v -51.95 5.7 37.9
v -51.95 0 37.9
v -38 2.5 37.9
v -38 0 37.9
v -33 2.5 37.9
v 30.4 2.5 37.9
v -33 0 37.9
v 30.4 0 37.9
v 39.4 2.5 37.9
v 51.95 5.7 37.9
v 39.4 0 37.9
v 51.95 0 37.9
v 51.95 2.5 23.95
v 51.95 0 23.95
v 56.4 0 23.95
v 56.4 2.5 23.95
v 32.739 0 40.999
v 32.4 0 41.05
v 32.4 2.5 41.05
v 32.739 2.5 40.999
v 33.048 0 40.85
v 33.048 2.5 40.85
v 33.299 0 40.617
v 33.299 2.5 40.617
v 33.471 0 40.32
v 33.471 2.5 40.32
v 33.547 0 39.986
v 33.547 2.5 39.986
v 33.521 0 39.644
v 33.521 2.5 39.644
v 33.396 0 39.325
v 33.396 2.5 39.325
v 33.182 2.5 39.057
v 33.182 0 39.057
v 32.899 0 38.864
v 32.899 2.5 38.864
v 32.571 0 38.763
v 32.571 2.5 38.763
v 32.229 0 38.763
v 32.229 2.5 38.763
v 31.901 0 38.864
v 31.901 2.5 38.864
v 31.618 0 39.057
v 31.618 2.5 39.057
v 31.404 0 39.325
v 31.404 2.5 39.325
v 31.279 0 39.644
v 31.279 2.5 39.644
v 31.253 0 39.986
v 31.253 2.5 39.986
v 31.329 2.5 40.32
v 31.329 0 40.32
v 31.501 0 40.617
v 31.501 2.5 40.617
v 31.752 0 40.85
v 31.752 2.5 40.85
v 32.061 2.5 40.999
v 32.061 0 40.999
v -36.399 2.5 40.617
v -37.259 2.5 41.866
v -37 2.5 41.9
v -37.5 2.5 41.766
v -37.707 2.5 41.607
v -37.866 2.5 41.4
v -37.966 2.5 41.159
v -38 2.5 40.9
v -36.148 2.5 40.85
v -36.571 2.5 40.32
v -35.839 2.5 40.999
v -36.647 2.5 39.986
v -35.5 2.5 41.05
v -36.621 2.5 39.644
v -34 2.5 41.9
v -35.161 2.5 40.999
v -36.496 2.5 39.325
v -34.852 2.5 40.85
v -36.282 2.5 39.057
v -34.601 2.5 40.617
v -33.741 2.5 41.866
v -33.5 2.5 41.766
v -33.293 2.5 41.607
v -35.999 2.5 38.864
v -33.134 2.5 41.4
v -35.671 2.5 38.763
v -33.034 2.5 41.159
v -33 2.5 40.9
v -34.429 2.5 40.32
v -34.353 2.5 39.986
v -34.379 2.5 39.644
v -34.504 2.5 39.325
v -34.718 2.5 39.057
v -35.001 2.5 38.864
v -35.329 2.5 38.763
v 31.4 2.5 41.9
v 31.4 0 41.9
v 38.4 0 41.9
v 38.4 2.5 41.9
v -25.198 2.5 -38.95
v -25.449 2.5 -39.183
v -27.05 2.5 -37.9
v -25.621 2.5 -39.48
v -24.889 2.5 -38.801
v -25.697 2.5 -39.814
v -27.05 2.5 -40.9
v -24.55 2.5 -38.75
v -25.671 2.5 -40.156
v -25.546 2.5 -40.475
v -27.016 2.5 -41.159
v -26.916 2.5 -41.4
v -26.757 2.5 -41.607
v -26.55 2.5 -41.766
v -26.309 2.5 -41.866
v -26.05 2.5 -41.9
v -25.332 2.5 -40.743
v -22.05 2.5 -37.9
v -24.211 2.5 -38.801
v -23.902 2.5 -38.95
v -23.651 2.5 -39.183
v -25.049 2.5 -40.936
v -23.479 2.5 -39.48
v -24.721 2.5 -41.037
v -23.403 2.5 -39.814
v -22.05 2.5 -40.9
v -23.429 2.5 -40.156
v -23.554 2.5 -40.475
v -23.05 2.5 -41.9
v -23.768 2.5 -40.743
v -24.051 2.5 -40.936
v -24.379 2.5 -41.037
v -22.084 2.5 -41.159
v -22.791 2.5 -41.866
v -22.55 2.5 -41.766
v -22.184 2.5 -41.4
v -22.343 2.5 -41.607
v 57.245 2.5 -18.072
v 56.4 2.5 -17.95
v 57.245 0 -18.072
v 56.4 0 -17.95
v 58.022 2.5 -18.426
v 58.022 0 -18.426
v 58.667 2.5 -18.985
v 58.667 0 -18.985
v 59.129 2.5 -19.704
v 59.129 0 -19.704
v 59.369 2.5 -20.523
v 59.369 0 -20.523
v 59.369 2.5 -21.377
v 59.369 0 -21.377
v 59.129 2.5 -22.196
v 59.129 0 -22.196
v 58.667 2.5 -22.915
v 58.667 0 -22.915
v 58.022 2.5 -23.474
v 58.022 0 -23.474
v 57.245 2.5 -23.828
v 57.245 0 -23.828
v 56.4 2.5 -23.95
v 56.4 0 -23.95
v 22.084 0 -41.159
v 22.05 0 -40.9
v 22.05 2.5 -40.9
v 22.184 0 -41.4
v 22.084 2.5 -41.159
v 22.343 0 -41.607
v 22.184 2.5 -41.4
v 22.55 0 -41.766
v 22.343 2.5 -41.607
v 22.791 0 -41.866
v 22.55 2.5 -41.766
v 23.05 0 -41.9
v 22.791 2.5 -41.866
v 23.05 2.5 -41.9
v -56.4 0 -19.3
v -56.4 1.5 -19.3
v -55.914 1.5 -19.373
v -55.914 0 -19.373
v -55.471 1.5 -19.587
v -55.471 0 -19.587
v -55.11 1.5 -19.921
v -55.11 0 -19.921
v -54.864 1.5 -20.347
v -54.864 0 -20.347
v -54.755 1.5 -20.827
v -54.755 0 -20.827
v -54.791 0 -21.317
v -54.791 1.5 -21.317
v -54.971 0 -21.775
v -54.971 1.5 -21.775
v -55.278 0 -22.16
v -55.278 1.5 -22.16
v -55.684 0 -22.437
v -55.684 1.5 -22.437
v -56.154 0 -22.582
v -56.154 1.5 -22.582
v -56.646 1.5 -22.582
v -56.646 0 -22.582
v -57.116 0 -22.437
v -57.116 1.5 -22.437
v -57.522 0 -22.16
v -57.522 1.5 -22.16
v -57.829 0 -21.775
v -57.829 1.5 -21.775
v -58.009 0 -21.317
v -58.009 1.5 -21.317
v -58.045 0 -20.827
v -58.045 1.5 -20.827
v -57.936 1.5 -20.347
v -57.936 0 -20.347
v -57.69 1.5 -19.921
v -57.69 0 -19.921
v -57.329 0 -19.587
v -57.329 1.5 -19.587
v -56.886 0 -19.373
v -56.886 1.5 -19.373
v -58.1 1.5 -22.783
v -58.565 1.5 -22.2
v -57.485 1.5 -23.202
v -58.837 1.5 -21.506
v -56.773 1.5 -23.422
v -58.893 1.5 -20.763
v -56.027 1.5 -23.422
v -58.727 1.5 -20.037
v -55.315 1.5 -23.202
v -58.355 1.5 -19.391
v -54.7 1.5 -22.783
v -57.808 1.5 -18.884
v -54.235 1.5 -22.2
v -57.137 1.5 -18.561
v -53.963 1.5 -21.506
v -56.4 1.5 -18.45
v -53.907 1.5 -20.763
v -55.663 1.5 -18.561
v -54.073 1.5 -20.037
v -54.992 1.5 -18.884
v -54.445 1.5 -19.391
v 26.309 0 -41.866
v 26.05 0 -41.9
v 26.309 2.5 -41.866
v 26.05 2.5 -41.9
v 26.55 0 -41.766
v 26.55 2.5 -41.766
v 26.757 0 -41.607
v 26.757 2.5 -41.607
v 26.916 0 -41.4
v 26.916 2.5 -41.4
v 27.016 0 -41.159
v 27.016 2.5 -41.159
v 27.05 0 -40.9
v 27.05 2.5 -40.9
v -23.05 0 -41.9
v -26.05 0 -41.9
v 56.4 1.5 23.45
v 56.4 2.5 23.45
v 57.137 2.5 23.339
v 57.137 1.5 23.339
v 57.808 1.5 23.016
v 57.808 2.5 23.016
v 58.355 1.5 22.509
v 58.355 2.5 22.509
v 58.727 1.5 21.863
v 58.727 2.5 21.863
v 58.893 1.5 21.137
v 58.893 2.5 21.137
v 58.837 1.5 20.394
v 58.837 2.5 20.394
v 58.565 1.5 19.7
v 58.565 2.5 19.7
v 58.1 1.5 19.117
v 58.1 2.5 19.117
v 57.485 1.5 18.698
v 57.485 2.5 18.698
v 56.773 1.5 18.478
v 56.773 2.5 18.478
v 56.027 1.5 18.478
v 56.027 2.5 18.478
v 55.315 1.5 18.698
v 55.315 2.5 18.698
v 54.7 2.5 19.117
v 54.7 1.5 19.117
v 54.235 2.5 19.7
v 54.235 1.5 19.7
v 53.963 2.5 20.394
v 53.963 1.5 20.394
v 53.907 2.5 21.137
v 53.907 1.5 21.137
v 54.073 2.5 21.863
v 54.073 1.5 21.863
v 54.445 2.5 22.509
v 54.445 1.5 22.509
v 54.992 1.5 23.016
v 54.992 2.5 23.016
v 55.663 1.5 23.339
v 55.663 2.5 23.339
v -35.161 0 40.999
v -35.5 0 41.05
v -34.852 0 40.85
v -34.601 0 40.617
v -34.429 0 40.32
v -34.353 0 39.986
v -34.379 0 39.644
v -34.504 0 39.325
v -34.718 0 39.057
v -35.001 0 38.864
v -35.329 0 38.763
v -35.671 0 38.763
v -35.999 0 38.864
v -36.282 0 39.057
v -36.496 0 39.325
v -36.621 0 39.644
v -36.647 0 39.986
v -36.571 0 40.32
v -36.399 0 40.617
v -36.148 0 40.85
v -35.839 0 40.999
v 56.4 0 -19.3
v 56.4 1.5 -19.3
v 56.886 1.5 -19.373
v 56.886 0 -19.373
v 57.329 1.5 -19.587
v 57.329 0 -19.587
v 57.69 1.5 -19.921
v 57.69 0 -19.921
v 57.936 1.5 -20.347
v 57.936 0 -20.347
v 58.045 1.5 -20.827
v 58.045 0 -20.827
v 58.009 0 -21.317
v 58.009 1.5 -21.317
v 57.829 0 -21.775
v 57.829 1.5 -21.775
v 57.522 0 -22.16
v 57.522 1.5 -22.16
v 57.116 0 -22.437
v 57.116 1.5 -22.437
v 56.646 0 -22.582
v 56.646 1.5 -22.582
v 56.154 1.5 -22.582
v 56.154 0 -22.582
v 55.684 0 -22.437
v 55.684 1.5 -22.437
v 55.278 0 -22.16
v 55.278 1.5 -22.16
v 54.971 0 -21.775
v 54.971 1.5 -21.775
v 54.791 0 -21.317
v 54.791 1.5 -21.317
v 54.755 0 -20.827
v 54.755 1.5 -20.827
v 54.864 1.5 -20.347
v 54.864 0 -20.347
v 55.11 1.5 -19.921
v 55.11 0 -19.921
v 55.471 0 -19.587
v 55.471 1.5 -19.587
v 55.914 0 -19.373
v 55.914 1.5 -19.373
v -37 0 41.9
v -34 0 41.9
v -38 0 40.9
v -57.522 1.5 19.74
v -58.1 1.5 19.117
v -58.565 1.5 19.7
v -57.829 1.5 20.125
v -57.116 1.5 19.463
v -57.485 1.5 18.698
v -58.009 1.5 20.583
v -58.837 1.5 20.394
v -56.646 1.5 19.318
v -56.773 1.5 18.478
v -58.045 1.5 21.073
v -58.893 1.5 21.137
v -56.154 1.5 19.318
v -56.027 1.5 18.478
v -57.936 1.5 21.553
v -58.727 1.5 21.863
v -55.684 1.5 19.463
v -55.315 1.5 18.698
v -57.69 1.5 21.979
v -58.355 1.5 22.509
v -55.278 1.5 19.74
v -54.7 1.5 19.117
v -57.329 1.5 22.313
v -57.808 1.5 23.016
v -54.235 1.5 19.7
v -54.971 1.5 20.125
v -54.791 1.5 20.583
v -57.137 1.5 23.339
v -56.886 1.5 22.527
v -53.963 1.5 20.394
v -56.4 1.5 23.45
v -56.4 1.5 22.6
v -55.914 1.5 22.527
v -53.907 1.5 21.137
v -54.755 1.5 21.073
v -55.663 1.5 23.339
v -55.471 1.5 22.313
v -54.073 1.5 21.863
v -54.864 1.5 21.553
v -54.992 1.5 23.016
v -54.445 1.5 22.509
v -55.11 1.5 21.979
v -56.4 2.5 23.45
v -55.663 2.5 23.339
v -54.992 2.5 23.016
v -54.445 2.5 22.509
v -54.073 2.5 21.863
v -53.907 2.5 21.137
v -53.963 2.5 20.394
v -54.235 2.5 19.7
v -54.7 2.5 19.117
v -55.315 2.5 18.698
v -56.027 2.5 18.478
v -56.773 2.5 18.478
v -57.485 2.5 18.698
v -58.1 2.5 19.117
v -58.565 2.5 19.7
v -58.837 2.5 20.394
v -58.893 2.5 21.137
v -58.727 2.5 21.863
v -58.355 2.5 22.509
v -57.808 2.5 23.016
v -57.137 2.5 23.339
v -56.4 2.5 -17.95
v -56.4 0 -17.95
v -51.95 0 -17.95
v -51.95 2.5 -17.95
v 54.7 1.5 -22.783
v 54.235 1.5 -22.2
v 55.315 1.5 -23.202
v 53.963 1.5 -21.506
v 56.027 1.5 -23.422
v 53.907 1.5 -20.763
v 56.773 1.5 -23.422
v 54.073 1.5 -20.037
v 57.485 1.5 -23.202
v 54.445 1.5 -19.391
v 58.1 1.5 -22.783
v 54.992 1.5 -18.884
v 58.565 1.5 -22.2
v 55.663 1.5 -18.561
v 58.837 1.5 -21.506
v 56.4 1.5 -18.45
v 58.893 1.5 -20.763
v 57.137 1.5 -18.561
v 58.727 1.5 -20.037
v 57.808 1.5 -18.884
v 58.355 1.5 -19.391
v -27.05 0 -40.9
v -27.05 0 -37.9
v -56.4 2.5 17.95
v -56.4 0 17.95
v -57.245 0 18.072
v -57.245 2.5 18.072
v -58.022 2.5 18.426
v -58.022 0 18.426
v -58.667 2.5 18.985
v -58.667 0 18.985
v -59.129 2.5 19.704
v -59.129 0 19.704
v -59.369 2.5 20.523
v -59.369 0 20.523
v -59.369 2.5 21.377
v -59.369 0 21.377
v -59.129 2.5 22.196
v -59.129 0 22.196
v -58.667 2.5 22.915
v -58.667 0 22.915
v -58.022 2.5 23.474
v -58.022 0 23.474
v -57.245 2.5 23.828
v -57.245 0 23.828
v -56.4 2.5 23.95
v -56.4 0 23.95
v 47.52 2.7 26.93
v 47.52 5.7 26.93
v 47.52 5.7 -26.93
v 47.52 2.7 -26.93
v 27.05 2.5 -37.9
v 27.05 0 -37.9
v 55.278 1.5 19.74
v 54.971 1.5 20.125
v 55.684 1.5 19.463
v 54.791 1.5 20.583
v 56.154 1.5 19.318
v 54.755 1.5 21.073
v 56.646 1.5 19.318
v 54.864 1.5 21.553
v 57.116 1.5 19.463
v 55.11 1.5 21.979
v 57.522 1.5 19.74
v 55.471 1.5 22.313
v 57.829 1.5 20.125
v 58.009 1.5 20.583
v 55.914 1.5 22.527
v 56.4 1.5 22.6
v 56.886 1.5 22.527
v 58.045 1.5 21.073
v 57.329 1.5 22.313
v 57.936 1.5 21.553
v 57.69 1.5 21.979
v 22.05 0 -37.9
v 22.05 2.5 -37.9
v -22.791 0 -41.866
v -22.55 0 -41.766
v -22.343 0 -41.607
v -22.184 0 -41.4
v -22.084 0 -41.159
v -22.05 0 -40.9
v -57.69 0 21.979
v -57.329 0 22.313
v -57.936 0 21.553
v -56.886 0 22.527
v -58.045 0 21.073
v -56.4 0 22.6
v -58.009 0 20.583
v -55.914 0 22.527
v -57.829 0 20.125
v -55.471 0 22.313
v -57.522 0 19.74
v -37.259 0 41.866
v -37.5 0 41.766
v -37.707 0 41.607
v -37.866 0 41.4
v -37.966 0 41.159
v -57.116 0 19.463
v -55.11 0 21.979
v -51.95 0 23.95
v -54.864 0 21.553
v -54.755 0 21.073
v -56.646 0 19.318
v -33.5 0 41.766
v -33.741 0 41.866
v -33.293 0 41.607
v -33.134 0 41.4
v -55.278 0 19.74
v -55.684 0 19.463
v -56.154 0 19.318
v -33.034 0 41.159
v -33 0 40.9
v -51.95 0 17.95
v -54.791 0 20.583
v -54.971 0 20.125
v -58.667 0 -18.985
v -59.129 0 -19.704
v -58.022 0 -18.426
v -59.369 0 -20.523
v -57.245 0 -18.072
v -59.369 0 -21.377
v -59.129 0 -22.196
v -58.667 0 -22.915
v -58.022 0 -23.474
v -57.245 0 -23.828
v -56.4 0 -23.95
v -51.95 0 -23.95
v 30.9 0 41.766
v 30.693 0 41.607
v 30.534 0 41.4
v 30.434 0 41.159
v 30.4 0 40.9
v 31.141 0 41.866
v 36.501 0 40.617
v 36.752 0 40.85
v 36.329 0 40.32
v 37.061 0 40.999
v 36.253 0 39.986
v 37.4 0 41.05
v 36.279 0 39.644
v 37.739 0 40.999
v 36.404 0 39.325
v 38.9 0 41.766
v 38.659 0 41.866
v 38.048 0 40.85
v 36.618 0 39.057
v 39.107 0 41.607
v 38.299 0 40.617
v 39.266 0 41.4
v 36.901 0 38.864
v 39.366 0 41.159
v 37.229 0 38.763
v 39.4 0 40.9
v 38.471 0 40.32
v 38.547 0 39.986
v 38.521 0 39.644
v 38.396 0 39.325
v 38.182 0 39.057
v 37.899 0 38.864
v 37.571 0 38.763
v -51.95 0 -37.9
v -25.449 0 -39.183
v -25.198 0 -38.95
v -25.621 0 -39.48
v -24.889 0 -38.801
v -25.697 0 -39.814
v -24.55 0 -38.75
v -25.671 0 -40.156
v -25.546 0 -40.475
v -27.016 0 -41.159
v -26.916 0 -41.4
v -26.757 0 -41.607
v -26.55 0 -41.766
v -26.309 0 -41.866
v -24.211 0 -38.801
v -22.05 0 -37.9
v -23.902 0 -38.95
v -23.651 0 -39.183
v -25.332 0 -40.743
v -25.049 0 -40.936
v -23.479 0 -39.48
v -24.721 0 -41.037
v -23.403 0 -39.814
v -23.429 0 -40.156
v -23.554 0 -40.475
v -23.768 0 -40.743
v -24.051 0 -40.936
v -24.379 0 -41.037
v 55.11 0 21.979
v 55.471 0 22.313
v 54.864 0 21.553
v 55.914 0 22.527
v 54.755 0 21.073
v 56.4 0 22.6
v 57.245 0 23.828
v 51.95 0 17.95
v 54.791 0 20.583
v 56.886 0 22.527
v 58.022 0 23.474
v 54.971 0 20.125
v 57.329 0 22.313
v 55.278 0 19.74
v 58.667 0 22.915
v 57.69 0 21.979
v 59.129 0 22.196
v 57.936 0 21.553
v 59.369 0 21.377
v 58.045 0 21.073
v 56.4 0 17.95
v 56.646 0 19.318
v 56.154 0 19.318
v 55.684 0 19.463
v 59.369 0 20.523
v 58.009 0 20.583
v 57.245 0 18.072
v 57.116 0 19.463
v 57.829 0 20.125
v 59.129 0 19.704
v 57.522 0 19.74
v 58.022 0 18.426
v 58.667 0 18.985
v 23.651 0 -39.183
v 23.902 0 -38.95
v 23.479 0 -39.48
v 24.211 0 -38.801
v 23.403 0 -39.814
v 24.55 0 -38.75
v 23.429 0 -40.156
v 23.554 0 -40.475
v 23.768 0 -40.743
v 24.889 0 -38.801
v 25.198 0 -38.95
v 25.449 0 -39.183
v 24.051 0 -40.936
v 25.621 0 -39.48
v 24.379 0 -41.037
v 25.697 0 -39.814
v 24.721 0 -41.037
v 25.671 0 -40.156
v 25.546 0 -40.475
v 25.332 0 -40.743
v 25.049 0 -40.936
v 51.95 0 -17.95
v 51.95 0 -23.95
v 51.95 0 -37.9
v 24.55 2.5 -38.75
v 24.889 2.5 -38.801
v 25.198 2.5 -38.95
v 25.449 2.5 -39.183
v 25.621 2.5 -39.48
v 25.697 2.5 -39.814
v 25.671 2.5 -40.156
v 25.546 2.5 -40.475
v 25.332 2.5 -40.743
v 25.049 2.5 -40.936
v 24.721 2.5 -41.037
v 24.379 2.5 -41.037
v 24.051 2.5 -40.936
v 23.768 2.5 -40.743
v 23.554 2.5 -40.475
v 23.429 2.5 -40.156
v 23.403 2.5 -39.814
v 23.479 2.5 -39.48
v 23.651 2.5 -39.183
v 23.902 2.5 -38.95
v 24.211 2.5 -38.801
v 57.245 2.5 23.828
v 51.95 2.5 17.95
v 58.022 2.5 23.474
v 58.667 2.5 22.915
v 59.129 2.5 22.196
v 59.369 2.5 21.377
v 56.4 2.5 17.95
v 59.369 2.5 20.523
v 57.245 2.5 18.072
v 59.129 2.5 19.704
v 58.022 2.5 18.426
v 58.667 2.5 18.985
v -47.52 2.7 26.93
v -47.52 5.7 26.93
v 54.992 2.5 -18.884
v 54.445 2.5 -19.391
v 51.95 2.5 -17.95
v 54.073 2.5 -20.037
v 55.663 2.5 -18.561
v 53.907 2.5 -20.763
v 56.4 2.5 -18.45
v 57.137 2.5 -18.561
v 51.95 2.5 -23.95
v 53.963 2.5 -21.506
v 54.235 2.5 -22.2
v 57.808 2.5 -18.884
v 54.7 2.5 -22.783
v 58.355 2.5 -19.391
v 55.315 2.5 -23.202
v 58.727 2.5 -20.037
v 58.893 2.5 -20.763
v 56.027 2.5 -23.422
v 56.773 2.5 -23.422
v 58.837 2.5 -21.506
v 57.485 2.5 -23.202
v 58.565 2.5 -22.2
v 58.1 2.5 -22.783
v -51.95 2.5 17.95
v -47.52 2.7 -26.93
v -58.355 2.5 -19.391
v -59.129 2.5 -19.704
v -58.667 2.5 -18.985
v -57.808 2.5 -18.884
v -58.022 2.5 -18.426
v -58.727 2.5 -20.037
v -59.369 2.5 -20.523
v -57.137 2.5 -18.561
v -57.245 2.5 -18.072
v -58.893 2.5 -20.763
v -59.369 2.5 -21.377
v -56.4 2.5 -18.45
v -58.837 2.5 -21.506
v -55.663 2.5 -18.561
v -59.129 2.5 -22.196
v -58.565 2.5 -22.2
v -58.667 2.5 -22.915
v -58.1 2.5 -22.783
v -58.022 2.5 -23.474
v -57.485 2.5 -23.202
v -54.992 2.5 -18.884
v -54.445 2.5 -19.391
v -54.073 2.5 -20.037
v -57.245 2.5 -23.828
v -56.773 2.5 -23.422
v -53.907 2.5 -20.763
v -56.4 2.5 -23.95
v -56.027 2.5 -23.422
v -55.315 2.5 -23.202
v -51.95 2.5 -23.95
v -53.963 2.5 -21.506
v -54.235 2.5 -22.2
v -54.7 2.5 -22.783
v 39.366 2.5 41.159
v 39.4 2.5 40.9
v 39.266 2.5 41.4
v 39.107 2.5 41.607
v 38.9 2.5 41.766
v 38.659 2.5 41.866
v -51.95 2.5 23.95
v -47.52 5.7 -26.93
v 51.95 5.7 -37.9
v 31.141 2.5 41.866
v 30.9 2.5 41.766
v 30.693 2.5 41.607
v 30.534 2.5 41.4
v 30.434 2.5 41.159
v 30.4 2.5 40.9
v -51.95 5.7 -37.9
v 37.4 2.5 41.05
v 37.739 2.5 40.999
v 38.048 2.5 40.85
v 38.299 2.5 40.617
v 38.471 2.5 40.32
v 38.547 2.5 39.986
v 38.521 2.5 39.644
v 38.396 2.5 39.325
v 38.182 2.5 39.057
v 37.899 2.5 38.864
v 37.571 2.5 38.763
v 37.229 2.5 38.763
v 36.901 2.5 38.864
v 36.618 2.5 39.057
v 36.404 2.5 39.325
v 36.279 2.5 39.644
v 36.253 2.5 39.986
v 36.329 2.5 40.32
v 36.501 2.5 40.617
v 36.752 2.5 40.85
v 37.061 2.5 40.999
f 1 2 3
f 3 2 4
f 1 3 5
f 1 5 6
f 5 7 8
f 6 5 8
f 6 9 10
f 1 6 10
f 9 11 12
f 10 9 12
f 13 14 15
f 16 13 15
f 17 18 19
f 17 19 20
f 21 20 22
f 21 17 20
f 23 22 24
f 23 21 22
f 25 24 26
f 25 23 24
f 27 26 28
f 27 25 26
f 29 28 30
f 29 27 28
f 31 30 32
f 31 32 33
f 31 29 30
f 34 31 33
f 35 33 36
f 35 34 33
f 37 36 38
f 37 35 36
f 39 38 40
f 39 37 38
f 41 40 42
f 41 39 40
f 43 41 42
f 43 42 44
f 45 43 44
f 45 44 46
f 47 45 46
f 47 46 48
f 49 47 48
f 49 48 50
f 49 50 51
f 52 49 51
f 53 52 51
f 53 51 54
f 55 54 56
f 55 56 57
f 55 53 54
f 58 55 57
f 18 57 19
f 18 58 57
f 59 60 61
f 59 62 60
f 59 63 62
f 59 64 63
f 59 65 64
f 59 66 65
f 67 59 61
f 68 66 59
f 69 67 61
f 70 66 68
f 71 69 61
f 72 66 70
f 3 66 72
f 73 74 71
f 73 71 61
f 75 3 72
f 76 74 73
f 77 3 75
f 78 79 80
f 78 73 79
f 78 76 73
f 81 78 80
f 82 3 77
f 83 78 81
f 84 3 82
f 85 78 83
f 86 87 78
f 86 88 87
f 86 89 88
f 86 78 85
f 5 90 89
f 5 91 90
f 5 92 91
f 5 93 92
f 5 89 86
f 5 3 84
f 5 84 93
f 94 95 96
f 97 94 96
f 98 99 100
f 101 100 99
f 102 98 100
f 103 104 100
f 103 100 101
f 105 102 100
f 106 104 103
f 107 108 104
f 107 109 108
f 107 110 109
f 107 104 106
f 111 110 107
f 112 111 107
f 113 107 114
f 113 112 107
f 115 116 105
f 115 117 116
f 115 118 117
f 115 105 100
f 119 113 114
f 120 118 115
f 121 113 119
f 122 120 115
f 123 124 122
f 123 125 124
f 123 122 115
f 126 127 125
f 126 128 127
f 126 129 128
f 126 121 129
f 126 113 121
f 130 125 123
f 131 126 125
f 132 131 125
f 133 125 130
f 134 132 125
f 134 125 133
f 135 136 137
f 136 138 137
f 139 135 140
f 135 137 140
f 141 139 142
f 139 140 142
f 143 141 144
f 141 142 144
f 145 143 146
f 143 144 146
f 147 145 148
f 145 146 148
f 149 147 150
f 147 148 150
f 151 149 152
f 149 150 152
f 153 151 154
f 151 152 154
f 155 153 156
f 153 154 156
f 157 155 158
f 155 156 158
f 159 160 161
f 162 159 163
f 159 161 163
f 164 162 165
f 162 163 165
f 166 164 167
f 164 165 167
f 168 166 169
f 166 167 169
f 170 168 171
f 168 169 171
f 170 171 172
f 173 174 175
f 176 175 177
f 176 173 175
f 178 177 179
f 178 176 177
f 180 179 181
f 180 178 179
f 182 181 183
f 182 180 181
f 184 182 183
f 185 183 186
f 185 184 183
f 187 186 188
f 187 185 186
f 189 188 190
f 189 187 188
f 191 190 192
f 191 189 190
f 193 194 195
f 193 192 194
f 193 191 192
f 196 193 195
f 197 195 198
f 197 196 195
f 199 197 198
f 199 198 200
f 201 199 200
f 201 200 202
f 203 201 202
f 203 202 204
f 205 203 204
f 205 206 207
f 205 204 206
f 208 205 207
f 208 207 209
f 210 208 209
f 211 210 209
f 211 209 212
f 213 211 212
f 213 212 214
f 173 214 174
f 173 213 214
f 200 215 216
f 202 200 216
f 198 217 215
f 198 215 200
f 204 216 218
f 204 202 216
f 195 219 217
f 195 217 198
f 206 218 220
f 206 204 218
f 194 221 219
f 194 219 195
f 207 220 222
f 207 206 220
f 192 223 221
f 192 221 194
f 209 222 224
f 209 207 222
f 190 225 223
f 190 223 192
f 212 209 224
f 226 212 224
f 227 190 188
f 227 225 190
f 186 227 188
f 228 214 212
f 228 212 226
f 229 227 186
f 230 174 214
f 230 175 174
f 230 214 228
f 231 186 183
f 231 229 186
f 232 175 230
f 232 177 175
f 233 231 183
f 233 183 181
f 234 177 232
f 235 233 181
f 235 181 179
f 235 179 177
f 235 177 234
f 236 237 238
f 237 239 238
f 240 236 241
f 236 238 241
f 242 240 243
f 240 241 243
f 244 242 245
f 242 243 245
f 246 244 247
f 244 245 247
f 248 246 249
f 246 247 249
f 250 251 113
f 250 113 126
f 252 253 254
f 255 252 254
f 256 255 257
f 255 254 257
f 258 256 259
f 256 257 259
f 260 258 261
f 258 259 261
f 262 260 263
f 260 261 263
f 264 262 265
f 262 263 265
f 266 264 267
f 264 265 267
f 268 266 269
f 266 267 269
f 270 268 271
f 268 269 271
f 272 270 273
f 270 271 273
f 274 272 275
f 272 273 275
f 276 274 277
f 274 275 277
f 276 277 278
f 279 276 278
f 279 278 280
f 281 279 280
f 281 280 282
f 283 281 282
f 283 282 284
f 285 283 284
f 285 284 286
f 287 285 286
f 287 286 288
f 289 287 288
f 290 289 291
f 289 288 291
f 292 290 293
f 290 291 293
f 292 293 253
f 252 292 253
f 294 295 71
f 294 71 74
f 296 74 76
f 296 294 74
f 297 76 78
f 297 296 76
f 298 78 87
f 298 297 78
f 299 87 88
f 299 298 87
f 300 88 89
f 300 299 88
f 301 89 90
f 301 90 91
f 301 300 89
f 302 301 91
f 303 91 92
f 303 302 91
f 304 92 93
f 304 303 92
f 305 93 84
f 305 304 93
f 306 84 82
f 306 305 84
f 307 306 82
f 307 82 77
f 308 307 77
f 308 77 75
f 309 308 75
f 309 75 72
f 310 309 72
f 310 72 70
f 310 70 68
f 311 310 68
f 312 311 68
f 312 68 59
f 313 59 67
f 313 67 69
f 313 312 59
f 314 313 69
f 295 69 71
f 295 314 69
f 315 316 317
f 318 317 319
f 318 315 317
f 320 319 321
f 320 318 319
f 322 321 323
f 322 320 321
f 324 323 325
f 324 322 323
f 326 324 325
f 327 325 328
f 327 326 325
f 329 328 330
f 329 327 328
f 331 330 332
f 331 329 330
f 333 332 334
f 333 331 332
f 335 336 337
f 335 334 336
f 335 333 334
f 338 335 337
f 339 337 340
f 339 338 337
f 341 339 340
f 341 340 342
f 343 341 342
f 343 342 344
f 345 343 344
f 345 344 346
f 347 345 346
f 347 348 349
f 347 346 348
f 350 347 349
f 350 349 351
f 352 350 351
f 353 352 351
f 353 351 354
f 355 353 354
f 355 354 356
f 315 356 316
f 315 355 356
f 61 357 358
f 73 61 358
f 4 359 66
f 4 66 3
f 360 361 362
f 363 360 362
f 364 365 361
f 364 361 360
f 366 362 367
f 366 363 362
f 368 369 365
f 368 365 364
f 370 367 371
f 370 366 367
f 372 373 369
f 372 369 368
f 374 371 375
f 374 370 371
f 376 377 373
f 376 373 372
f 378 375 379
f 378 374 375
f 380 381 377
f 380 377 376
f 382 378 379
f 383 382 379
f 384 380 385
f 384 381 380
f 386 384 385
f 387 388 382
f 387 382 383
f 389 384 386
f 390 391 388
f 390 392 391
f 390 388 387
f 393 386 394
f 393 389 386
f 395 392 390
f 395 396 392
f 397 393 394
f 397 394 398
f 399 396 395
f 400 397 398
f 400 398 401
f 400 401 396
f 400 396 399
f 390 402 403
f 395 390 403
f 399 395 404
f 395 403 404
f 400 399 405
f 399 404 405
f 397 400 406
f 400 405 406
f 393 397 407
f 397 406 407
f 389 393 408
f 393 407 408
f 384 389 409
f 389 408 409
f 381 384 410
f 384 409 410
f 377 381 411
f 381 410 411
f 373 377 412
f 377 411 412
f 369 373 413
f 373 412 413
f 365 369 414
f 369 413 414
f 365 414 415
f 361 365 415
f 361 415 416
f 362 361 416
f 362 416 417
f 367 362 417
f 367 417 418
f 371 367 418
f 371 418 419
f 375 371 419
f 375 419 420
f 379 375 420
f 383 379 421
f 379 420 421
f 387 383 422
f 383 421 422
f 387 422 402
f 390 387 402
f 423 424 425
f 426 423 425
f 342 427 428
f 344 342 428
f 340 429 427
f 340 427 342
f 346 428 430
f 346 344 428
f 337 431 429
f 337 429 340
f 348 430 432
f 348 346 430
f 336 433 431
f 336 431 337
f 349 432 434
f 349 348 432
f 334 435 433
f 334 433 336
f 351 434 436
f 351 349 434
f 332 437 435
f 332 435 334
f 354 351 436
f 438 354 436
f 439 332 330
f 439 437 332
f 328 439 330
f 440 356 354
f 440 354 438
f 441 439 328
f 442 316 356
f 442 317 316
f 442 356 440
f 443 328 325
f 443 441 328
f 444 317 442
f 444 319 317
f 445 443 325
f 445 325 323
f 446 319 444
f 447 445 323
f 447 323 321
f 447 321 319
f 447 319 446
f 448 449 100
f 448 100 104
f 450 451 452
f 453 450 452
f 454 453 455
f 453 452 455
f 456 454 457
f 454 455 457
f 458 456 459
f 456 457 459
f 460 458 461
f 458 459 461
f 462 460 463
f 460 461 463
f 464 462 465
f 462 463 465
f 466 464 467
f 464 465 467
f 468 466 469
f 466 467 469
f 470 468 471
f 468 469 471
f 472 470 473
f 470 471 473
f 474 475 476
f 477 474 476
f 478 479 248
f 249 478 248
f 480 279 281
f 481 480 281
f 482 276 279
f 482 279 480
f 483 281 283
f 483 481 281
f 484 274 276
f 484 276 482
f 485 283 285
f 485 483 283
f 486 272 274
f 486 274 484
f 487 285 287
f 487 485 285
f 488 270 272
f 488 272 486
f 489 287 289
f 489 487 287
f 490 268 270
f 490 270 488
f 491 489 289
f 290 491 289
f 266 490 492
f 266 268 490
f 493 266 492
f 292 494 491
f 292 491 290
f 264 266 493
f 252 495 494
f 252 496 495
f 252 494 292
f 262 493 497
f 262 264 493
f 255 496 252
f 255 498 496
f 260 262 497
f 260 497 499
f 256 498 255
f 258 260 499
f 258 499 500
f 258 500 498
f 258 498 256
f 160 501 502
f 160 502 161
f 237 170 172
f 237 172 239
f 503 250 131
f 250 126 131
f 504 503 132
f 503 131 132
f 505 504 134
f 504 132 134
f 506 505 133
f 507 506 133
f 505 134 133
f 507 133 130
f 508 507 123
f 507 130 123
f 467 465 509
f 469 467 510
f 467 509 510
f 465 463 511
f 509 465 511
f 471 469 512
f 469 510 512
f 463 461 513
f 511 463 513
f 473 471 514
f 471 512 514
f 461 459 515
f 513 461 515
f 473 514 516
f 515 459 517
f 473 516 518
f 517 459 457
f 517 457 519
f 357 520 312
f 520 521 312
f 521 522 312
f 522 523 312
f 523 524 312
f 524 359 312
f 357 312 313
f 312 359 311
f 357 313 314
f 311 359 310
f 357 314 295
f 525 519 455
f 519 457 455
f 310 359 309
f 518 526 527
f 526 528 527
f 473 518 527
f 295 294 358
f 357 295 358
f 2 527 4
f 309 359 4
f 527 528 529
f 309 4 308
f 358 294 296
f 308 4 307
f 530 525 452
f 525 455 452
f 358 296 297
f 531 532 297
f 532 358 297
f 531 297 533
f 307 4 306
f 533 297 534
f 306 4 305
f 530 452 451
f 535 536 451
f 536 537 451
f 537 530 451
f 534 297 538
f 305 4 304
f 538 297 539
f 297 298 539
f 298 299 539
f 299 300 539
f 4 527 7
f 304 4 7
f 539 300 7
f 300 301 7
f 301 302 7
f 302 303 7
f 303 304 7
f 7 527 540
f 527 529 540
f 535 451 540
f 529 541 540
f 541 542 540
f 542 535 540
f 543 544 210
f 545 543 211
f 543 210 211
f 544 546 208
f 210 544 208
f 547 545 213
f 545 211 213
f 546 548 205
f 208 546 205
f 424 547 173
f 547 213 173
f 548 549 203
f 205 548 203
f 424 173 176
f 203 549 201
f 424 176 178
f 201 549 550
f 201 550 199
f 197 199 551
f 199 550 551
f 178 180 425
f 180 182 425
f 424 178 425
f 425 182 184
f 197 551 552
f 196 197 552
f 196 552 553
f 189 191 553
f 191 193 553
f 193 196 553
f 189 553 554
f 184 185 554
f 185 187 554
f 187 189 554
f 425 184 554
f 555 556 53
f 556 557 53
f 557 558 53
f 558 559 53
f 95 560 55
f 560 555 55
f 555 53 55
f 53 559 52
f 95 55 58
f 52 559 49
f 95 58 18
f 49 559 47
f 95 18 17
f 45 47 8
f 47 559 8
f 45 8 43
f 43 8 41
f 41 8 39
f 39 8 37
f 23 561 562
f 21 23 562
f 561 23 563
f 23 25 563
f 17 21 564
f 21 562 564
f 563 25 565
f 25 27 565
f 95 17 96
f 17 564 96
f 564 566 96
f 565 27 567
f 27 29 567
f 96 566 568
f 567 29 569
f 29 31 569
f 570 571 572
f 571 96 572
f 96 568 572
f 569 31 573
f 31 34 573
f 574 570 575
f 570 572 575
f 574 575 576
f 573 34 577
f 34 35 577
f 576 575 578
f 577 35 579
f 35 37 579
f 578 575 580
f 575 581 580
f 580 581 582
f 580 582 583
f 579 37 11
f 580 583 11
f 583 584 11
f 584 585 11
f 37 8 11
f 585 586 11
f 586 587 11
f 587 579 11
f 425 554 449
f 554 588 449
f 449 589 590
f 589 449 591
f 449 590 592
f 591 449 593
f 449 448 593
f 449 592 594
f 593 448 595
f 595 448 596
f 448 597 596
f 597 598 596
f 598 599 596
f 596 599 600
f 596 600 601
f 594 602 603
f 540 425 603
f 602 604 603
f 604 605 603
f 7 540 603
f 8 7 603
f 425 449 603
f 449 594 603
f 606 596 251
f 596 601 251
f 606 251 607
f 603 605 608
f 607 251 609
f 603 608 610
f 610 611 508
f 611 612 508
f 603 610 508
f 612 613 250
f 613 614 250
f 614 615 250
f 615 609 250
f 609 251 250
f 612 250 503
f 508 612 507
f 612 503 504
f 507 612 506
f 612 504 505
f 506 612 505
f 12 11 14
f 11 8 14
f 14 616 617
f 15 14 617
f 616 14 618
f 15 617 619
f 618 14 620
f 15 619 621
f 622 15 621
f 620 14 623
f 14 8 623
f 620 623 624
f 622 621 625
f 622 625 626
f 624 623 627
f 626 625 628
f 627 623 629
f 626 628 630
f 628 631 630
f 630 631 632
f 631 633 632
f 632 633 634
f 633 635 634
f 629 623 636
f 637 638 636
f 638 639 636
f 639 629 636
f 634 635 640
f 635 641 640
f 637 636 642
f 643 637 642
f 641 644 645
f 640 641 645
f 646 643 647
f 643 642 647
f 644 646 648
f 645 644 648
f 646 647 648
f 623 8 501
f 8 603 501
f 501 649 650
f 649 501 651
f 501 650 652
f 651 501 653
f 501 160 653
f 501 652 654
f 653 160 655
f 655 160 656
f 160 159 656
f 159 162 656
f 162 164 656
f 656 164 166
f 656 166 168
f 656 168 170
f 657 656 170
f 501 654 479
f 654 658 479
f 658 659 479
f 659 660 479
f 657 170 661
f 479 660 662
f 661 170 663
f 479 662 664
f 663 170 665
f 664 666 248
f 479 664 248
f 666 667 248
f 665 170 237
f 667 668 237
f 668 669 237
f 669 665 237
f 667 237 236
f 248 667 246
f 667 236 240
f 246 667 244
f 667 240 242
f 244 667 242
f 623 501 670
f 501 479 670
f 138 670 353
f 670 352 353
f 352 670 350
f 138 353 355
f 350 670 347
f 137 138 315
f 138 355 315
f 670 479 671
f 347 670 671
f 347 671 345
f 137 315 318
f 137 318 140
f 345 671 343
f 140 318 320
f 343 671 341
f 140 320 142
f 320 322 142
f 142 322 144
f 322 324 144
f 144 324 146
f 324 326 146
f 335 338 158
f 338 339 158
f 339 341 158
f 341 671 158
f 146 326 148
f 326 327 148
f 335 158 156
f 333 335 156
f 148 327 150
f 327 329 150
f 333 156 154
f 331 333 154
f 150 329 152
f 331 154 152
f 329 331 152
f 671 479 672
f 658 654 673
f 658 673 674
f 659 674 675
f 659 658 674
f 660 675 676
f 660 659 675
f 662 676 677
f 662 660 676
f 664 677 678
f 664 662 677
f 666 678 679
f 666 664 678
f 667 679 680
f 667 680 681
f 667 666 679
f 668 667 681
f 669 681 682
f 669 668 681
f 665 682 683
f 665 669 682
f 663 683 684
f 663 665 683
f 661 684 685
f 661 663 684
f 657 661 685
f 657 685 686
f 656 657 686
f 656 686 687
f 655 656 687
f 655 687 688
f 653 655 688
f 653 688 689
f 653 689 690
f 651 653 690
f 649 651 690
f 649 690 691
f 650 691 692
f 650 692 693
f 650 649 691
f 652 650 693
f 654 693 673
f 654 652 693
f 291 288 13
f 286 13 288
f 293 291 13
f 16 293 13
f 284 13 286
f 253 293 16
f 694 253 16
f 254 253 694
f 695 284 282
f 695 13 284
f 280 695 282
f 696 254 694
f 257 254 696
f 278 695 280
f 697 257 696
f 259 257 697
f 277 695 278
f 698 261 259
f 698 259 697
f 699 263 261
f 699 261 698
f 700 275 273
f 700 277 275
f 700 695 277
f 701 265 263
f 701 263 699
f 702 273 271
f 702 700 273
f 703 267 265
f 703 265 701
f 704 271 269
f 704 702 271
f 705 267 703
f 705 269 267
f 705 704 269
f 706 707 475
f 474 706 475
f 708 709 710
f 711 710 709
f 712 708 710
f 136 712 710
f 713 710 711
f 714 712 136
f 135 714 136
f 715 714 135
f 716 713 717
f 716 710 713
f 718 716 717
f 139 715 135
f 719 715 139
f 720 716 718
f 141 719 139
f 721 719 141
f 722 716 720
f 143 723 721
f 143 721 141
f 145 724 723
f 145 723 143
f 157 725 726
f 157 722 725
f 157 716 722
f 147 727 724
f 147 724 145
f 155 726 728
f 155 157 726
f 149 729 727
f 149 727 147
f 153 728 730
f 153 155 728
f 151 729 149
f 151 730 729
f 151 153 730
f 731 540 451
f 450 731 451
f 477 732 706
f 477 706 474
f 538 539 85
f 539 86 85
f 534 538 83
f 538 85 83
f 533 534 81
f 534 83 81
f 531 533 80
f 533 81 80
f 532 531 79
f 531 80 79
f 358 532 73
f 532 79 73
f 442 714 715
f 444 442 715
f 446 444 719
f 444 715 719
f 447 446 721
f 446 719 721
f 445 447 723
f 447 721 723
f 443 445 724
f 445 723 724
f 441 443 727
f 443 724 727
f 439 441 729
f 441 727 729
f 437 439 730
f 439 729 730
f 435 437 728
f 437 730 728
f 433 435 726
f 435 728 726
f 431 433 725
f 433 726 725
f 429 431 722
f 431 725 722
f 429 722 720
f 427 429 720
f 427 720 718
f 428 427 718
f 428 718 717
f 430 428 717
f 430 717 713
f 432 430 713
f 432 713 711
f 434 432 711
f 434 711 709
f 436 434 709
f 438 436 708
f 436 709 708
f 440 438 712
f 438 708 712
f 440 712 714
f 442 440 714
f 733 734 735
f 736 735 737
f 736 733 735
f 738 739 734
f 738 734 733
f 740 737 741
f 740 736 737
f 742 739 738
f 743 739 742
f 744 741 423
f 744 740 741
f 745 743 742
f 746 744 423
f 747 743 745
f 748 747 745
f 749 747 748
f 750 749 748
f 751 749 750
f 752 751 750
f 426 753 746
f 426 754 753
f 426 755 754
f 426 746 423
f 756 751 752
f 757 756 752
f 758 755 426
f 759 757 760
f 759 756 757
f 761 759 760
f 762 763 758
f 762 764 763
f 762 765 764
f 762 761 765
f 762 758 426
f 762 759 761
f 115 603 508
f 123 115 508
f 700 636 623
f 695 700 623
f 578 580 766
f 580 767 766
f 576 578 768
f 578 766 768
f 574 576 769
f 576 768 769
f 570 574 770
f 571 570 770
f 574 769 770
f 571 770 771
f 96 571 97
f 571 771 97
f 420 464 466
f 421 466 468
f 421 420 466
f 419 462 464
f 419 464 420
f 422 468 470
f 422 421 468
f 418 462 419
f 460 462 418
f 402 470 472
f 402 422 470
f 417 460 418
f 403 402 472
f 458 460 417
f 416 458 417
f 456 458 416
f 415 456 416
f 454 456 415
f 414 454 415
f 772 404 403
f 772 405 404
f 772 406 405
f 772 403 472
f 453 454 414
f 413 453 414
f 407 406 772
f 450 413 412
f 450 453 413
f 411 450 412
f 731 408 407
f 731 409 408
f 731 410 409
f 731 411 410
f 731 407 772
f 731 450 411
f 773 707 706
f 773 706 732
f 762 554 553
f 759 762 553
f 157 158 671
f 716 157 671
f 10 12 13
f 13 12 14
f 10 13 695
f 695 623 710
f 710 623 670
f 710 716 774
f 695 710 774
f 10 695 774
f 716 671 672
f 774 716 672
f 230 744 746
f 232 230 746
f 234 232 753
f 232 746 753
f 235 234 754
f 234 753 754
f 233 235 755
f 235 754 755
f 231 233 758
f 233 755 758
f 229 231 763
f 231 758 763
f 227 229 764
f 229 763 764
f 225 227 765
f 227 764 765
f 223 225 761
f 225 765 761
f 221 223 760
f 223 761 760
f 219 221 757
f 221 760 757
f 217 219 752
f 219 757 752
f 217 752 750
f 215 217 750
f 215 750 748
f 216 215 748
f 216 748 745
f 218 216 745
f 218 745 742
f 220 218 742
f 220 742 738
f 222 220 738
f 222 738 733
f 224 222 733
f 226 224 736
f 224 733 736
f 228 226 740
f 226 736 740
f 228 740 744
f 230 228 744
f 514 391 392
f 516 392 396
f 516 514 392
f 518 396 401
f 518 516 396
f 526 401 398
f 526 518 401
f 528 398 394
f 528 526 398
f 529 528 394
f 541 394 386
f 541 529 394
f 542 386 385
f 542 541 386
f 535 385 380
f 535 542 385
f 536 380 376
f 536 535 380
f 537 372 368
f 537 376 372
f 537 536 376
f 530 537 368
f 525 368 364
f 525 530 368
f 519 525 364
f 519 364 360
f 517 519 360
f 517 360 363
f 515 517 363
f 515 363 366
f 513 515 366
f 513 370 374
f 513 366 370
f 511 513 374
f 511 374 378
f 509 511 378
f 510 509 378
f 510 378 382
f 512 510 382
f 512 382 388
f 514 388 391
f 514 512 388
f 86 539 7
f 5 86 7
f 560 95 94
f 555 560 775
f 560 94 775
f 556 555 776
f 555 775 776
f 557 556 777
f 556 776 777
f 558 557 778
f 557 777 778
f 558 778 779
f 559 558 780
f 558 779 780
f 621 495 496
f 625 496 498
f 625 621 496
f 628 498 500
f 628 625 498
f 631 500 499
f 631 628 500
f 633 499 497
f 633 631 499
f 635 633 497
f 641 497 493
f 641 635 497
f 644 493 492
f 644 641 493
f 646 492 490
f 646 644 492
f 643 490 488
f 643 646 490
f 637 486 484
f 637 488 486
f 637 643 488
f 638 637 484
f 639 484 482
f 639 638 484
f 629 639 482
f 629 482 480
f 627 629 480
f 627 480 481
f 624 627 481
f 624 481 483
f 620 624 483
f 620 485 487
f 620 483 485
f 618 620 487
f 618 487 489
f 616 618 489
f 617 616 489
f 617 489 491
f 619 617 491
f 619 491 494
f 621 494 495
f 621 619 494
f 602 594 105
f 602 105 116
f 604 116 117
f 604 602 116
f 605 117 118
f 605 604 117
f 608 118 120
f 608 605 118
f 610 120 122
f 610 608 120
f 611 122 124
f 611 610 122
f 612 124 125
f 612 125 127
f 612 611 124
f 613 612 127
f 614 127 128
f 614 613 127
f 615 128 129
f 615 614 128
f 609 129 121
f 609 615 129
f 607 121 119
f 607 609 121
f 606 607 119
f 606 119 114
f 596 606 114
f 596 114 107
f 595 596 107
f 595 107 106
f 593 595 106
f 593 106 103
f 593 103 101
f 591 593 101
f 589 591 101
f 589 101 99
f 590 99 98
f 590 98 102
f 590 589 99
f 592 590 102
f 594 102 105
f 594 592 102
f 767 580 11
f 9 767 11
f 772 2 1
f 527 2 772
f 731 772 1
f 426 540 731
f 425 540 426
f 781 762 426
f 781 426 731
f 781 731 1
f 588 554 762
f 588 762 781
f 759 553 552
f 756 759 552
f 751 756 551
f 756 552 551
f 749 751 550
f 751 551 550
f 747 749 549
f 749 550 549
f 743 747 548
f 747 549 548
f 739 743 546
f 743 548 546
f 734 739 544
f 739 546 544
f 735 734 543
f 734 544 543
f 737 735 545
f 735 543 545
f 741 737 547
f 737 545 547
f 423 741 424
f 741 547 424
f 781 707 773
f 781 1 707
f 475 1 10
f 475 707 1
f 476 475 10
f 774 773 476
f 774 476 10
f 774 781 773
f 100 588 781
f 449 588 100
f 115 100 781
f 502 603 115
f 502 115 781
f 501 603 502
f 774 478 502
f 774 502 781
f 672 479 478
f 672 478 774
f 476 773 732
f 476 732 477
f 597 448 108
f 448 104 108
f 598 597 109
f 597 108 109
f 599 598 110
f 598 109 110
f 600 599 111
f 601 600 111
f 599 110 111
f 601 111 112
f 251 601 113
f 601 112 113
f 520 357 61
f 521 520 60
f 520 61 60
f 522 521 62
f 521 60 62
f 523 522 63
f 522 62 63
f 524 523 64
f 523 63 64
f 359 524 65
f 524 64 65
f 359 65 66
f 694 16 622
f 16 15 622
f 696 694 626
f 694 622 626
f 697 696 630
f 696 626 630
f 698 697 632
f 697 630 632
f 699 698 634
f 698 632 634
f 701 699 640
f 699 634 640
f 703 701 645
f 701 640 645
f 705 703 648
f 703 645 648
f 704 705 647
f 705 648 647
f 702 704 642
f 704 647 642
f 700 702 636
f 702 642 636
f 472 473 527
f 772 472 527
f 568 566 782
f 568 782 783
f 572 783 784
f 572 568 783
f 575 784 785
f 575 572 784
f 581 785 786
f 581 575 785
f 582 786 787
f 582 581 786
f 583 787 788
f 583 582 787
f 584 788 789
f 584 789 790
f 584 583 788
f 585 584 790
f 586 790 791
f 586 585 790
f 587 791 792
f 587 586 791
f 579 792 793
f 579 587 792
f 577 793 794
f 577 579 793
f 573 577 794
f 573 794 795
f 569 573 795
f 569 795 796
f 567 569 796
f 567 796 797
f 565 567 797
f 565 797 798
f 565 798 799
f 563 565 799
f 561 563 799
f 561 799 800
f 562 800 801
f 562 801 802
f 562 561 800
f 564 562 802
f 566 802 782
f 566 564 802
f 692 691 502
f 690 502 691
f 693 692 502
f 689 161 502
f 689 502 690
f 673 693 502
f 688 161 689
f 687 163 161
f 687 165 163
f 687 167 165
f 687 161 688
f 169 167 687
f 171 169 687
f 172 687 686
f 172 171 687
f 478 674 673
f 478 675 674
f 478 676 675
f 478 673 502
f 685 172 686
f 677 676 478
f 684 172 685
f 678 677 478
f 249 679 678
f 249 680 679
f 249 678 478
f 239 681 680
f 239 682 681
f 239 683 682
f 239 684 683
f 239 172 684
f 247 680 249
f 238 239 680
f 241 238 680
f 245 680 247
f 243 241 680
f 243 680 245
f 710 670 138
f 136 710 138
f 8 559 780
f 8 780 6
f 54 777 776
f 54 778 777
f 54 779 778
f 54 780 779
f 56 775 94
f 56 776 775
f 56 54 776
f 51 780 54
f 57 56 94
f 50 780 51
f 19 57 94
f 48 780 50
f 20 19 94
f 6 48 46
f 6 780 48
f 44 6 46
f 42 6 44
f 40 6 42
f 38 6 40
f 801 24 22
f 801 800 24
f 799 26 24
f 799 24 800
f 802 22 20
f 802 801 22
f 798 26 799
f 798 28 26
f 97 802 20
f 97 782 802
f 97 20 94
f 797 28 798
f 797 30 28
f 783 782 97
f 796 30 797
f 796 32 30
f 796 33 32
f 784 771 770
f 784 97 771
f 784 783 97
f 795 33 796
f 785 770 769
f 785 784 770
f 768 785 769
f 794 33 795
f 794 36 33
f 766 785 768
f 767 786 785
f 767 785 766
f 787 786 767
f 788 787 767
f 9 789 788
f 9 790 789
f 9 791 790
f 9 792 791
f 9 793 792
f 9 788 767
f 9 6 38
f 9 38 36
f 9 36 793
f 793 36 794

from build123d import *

# Parameters (mm, degrees)
SKETCH_1_W          = 103.9
SKETCH_1_H          = 75.8
EXTRUDE_1_DEPTH     = 5.7
SKETCH_2_R          = 3
SKETCH_2_R_2        = 1.65
SKETCH_2_W          = 5
SKETCH_2_H          = 4
SKETCH_2_R_3        = 1.15
SKETCH_2_W_2        = 9
EXTRUDE_2_DEPTH     = 2.5
FILLET_1_R          = 1
SKETCH_3_R          = 2.5
CUT_EXTRUDE_1_DEPTH = 1
SKETCH_4_W          = 95.04
SKETCH_4_H          = 53.86
CUT_EXTRUDE_2_DEPTH = 3


with BuildPart() as part:
    # 草图1 → 凸台-拉伸1 (new body)
    with BuildSketch(Plane(origin=(0, 0, 0), x_dir=(1, 0, 0), z_dir=(0, 1, 0))):
        Rectangle(SKETCH_1_W, SKETCH_1_H)
    extrude(amount=EXTRUDE_1_DEPTH)

    # 草图2 → 凸台-拉伸2 (add)
    # profile 1 of 12: a face of its own
    with BuildSketch(Plane(origin=(0, 0, 0), x_dir=(1, 0, 0), z_dir=(0, 1, 0))):
        with BuildLine():
            ThreePointArc((-53.4, 20.95), (-54.278679656, 18.828679656), (-56.4, 17.95))
            Line((-56.4, 17.95), (-51.95, 17.95))
            Line((-51.95, 17.95), (-51.95, 23.95))
            Line((-51.95, 23.95), (-56.4, 23.95))
            ThreePointArc((-56.4, 23.95), (-54.278679656, 23.071320344), (-53.4, 20.95))
        make_face()
    # profile 2 of 12: a face of its own
    with BuildSketch(Plane(origin=(0, 0, 0), x_dir=(1, 0, 0), z_dir=(0, 1, 0))):
        with Locations((-56.4, 20.95)):
            Circle(SKETCH_2_R)
        with Locations(Location((-56.4, 20.95, 0), (0, 0, 270))):
            Circle(SKETCH_2_R_2, mode=Mode.SUBTRACT)
    # profile 3 of 12: a face of its own
    with BuildSketch(Plane(origin=(0, 0, 0), x_dir=(1, 0, 0), z_dir=(0, 1, 0))):
        with Locations((-24.55, 39.9)):
            Rectangle(SKETCH_2_W, SKETCH_2_H)
        with Locations(Location((-24.55, 39.9, 0), (0, 0, 270))):
            Circle(SKETCH_2_R_3, mode=Mode.SUBTRACT)
    # profile 4 of 12: a face of its own
    with BuildSketch(Plane(origin=(0, 0, 0), x_dir=(1, 0, 0), z_dir=(0, 1, 0))):
        with Locations((24.55, 39.9)):
            Rectangle(SKETCH_2_W, SKETCH_2_H)
        with Locations(Location((24.55, 39.9, 0), (0, 0, 270))):
            Circle(SKETCH_2_R_3, mode=Mode.SUBTRACT)
    # profile 5 of 12: a face of its own
    with BuildSketch(Plane(origin=(0, 0, 0), x_dir=(1, 0, 0), z_dir=(0, 1, 0))):
        with BuildLine():
            Line((51.95, 17.95), (56.4, 17.95))
            ThreePointArc((56.4, 17.95), (53.4, 20.95), (56.4, 23.95))
            Line((56.4, 23.95), (51.95, 23.95))
            Line((51.95, 23.95), (51.95, 17.95))
        make_face()
    # profile 6 of 12: a face of its own
    with BuildSketch(Plane(origin=(0, 0, 0), x_dir=(1, 0, 0), z_dir=(0, 1, 0))):
        with Locations((56.4, 20.95)):
            Circle(SKETCH_2_R)
        with Locations(Location((56.4, 20.95, 0), (0, 0, 270))):
            Circle(SKETCH_2_R_2, mode=Mode.SUBTRACT)
    # profile 7 of 12: a face of its own
    with BuildSketch(Plane(origin=(0, 0, 0), x_dir=(1, 0, 0), z_dir=(0, 1, 0))):
        with Locations((56.4, -20.95)):
            Circle(SKETCH_2_R)
        with Locations(Location((56.4, -20.95, 0), (0, 0, 270))):
            Circle(SKETCH_2_R_2, mode=Mode.SUBTRACT)
    # profile 8 of 12: a face of its own
    with BuildSketch(Plane(origin=(0, 0, 0), x_dir=(1, 0, 0), z_dir=(0, 1, 0))):
        with BuildLine():
            ThreePointArc((56.4, -23.95), (53.4, -20.95), (56.4, -17.95))
            Line((56.4, -17.95), (51.95, -17.95))
            Line((51.95, -17.95), (51.95, -23.95))
            Line((51.95, -23.95), (56.4, -23.95))
        make_face()
    # profile 9 of 12: a face of its own
    with BuildSketch(Plane(origin=(0, 0, 0), x_dir=(1, 0, 0), z_dir=(0, 1, 0))):
        with Locations((34.9, -39.9)):
            Rectangle(SKETCH_2_W_2, SKETCH_2_H)
        with Locations(Location((37.4, -39.9, 0), (0, 0, 270))):
            Circle(SKETCH_2_R_3, mode=Mode.SUBTRACT)
        with Locations(Location((32.4, -39.9, 0), (0, 0, 270))):
            Circle(SKETCH_2_R_3, mode=Mode.SUBTRACT)
    # profile 10 of 12: a face of its own
    with BuildSketch(Plane(origin=(0, 0, 0), x_dir=(1, 0, 0), z_dir=(0, 1, 0))):
        with Locations((-35.5, -39.9)):
            Rectangle(SKETCH_2_W, SKETCH_2_H)
        with Locations(Location((-35.5, -39.9, 0), (0, 0, 270))):
            Circle(SKETCH_2_R_3, mode=Mode.SUBTRACT)
    # profile 11 of 12: a face of its own
    with BuildSketch(Plane(origin=(0, 0, 0), x_dir=(1, 0, 0), z_dir=(0, 1, 0))):
        with Locations((-56.4, -20.95)):
            Circle(SKETCH_2_R)
        with Locations(Location((-56.4, -20.95, 0), (0, 0, 270))):
            Circle(SKETCH_2_R_2, mode=Mode.SUBTRACT)
    # profile 12 of 12: a face of its own
    with BuildSketch(Plane(origin=(0, 0, 0), x_dir=(1, 0, 0), z_dir=(0, 1, 0))):
        with BuildLine():
            ThreePointArc((-53.4, -20.95), (-54.278679656, -23.071320344), (-56.4, -23.95))
            Line((-56.4, -23.95), (-51.95, -23.95))
            Line((-51.95, -23.95), (-51.95, -17.95))
            Line((-51.95, -17.95), (-56.4, -17.95))
            ThreePointArc((-56.4, -17.95), (-54.278679656, -18.828679656), (-53.4, -20.95))
        make_face()
    extrude(amount=EXTRUDE_2_DEPTH)

    # 圆角1
    fillet_1_edges = [part.edges().sort_by_distance(p)[0] for p in [
        (-27.05, 1.25, -41.9),
        (-22.05, 1.25, -41.9),
        (22.05, 1.25, -41.9),
        (27.05, 1.25, -41.9),
        (30.4, 1.25, 41.9),
        (39.4, 1.25, 41.9),
        (-38, 1.25, 41.9),
        (-33, 1.25, 41.9),
    ]]
    fillet(fillet_1_edges, radius=FILLET_1_R)

    # 草图3 → 切除-拉伸1 (cut)
    with BuildSketch(Plane(origin=(0, 2.5, 0), x_dir=(1, 0, 0), z_dir=(0, 1, 0))):
        with Locations(Location((-56.4, -20.95, 0), (0, 0, 270))):
            Circle(SKETCH_3_R)
        with Locations(Location((-56.4, 20.95, 0), (0, 0, 270))):
            Circle(SKETCH_3_R)
        with Locations(Location((56.4, 20.95, 0), (0, 0, 270))):
            Circle(SKETCH_3_R)
        with Locations(Location((56.4, -20.95, 0), (0, 0, 270))):
            Circle(SKETCH_3_R)
    extrude(amount=-CUT_EXTRUDE_1_DEPTH, mode=Mode.SUBTRACT)

    # 草图4 → 切除-拉伸2 (cut)
    with BuildSketch(Plane(origin=(0, 5.7, 0), x_dir=(1, 0, 0), z_dir=(0, 1, 0))):
        Rectangle(SKETCH_4_W, SKETCH_4_H)
    extrude(amount=-CUT_EXTRUDE_2_DEPTH, mode=Mode.SUBTRACT)


solid = part.part
